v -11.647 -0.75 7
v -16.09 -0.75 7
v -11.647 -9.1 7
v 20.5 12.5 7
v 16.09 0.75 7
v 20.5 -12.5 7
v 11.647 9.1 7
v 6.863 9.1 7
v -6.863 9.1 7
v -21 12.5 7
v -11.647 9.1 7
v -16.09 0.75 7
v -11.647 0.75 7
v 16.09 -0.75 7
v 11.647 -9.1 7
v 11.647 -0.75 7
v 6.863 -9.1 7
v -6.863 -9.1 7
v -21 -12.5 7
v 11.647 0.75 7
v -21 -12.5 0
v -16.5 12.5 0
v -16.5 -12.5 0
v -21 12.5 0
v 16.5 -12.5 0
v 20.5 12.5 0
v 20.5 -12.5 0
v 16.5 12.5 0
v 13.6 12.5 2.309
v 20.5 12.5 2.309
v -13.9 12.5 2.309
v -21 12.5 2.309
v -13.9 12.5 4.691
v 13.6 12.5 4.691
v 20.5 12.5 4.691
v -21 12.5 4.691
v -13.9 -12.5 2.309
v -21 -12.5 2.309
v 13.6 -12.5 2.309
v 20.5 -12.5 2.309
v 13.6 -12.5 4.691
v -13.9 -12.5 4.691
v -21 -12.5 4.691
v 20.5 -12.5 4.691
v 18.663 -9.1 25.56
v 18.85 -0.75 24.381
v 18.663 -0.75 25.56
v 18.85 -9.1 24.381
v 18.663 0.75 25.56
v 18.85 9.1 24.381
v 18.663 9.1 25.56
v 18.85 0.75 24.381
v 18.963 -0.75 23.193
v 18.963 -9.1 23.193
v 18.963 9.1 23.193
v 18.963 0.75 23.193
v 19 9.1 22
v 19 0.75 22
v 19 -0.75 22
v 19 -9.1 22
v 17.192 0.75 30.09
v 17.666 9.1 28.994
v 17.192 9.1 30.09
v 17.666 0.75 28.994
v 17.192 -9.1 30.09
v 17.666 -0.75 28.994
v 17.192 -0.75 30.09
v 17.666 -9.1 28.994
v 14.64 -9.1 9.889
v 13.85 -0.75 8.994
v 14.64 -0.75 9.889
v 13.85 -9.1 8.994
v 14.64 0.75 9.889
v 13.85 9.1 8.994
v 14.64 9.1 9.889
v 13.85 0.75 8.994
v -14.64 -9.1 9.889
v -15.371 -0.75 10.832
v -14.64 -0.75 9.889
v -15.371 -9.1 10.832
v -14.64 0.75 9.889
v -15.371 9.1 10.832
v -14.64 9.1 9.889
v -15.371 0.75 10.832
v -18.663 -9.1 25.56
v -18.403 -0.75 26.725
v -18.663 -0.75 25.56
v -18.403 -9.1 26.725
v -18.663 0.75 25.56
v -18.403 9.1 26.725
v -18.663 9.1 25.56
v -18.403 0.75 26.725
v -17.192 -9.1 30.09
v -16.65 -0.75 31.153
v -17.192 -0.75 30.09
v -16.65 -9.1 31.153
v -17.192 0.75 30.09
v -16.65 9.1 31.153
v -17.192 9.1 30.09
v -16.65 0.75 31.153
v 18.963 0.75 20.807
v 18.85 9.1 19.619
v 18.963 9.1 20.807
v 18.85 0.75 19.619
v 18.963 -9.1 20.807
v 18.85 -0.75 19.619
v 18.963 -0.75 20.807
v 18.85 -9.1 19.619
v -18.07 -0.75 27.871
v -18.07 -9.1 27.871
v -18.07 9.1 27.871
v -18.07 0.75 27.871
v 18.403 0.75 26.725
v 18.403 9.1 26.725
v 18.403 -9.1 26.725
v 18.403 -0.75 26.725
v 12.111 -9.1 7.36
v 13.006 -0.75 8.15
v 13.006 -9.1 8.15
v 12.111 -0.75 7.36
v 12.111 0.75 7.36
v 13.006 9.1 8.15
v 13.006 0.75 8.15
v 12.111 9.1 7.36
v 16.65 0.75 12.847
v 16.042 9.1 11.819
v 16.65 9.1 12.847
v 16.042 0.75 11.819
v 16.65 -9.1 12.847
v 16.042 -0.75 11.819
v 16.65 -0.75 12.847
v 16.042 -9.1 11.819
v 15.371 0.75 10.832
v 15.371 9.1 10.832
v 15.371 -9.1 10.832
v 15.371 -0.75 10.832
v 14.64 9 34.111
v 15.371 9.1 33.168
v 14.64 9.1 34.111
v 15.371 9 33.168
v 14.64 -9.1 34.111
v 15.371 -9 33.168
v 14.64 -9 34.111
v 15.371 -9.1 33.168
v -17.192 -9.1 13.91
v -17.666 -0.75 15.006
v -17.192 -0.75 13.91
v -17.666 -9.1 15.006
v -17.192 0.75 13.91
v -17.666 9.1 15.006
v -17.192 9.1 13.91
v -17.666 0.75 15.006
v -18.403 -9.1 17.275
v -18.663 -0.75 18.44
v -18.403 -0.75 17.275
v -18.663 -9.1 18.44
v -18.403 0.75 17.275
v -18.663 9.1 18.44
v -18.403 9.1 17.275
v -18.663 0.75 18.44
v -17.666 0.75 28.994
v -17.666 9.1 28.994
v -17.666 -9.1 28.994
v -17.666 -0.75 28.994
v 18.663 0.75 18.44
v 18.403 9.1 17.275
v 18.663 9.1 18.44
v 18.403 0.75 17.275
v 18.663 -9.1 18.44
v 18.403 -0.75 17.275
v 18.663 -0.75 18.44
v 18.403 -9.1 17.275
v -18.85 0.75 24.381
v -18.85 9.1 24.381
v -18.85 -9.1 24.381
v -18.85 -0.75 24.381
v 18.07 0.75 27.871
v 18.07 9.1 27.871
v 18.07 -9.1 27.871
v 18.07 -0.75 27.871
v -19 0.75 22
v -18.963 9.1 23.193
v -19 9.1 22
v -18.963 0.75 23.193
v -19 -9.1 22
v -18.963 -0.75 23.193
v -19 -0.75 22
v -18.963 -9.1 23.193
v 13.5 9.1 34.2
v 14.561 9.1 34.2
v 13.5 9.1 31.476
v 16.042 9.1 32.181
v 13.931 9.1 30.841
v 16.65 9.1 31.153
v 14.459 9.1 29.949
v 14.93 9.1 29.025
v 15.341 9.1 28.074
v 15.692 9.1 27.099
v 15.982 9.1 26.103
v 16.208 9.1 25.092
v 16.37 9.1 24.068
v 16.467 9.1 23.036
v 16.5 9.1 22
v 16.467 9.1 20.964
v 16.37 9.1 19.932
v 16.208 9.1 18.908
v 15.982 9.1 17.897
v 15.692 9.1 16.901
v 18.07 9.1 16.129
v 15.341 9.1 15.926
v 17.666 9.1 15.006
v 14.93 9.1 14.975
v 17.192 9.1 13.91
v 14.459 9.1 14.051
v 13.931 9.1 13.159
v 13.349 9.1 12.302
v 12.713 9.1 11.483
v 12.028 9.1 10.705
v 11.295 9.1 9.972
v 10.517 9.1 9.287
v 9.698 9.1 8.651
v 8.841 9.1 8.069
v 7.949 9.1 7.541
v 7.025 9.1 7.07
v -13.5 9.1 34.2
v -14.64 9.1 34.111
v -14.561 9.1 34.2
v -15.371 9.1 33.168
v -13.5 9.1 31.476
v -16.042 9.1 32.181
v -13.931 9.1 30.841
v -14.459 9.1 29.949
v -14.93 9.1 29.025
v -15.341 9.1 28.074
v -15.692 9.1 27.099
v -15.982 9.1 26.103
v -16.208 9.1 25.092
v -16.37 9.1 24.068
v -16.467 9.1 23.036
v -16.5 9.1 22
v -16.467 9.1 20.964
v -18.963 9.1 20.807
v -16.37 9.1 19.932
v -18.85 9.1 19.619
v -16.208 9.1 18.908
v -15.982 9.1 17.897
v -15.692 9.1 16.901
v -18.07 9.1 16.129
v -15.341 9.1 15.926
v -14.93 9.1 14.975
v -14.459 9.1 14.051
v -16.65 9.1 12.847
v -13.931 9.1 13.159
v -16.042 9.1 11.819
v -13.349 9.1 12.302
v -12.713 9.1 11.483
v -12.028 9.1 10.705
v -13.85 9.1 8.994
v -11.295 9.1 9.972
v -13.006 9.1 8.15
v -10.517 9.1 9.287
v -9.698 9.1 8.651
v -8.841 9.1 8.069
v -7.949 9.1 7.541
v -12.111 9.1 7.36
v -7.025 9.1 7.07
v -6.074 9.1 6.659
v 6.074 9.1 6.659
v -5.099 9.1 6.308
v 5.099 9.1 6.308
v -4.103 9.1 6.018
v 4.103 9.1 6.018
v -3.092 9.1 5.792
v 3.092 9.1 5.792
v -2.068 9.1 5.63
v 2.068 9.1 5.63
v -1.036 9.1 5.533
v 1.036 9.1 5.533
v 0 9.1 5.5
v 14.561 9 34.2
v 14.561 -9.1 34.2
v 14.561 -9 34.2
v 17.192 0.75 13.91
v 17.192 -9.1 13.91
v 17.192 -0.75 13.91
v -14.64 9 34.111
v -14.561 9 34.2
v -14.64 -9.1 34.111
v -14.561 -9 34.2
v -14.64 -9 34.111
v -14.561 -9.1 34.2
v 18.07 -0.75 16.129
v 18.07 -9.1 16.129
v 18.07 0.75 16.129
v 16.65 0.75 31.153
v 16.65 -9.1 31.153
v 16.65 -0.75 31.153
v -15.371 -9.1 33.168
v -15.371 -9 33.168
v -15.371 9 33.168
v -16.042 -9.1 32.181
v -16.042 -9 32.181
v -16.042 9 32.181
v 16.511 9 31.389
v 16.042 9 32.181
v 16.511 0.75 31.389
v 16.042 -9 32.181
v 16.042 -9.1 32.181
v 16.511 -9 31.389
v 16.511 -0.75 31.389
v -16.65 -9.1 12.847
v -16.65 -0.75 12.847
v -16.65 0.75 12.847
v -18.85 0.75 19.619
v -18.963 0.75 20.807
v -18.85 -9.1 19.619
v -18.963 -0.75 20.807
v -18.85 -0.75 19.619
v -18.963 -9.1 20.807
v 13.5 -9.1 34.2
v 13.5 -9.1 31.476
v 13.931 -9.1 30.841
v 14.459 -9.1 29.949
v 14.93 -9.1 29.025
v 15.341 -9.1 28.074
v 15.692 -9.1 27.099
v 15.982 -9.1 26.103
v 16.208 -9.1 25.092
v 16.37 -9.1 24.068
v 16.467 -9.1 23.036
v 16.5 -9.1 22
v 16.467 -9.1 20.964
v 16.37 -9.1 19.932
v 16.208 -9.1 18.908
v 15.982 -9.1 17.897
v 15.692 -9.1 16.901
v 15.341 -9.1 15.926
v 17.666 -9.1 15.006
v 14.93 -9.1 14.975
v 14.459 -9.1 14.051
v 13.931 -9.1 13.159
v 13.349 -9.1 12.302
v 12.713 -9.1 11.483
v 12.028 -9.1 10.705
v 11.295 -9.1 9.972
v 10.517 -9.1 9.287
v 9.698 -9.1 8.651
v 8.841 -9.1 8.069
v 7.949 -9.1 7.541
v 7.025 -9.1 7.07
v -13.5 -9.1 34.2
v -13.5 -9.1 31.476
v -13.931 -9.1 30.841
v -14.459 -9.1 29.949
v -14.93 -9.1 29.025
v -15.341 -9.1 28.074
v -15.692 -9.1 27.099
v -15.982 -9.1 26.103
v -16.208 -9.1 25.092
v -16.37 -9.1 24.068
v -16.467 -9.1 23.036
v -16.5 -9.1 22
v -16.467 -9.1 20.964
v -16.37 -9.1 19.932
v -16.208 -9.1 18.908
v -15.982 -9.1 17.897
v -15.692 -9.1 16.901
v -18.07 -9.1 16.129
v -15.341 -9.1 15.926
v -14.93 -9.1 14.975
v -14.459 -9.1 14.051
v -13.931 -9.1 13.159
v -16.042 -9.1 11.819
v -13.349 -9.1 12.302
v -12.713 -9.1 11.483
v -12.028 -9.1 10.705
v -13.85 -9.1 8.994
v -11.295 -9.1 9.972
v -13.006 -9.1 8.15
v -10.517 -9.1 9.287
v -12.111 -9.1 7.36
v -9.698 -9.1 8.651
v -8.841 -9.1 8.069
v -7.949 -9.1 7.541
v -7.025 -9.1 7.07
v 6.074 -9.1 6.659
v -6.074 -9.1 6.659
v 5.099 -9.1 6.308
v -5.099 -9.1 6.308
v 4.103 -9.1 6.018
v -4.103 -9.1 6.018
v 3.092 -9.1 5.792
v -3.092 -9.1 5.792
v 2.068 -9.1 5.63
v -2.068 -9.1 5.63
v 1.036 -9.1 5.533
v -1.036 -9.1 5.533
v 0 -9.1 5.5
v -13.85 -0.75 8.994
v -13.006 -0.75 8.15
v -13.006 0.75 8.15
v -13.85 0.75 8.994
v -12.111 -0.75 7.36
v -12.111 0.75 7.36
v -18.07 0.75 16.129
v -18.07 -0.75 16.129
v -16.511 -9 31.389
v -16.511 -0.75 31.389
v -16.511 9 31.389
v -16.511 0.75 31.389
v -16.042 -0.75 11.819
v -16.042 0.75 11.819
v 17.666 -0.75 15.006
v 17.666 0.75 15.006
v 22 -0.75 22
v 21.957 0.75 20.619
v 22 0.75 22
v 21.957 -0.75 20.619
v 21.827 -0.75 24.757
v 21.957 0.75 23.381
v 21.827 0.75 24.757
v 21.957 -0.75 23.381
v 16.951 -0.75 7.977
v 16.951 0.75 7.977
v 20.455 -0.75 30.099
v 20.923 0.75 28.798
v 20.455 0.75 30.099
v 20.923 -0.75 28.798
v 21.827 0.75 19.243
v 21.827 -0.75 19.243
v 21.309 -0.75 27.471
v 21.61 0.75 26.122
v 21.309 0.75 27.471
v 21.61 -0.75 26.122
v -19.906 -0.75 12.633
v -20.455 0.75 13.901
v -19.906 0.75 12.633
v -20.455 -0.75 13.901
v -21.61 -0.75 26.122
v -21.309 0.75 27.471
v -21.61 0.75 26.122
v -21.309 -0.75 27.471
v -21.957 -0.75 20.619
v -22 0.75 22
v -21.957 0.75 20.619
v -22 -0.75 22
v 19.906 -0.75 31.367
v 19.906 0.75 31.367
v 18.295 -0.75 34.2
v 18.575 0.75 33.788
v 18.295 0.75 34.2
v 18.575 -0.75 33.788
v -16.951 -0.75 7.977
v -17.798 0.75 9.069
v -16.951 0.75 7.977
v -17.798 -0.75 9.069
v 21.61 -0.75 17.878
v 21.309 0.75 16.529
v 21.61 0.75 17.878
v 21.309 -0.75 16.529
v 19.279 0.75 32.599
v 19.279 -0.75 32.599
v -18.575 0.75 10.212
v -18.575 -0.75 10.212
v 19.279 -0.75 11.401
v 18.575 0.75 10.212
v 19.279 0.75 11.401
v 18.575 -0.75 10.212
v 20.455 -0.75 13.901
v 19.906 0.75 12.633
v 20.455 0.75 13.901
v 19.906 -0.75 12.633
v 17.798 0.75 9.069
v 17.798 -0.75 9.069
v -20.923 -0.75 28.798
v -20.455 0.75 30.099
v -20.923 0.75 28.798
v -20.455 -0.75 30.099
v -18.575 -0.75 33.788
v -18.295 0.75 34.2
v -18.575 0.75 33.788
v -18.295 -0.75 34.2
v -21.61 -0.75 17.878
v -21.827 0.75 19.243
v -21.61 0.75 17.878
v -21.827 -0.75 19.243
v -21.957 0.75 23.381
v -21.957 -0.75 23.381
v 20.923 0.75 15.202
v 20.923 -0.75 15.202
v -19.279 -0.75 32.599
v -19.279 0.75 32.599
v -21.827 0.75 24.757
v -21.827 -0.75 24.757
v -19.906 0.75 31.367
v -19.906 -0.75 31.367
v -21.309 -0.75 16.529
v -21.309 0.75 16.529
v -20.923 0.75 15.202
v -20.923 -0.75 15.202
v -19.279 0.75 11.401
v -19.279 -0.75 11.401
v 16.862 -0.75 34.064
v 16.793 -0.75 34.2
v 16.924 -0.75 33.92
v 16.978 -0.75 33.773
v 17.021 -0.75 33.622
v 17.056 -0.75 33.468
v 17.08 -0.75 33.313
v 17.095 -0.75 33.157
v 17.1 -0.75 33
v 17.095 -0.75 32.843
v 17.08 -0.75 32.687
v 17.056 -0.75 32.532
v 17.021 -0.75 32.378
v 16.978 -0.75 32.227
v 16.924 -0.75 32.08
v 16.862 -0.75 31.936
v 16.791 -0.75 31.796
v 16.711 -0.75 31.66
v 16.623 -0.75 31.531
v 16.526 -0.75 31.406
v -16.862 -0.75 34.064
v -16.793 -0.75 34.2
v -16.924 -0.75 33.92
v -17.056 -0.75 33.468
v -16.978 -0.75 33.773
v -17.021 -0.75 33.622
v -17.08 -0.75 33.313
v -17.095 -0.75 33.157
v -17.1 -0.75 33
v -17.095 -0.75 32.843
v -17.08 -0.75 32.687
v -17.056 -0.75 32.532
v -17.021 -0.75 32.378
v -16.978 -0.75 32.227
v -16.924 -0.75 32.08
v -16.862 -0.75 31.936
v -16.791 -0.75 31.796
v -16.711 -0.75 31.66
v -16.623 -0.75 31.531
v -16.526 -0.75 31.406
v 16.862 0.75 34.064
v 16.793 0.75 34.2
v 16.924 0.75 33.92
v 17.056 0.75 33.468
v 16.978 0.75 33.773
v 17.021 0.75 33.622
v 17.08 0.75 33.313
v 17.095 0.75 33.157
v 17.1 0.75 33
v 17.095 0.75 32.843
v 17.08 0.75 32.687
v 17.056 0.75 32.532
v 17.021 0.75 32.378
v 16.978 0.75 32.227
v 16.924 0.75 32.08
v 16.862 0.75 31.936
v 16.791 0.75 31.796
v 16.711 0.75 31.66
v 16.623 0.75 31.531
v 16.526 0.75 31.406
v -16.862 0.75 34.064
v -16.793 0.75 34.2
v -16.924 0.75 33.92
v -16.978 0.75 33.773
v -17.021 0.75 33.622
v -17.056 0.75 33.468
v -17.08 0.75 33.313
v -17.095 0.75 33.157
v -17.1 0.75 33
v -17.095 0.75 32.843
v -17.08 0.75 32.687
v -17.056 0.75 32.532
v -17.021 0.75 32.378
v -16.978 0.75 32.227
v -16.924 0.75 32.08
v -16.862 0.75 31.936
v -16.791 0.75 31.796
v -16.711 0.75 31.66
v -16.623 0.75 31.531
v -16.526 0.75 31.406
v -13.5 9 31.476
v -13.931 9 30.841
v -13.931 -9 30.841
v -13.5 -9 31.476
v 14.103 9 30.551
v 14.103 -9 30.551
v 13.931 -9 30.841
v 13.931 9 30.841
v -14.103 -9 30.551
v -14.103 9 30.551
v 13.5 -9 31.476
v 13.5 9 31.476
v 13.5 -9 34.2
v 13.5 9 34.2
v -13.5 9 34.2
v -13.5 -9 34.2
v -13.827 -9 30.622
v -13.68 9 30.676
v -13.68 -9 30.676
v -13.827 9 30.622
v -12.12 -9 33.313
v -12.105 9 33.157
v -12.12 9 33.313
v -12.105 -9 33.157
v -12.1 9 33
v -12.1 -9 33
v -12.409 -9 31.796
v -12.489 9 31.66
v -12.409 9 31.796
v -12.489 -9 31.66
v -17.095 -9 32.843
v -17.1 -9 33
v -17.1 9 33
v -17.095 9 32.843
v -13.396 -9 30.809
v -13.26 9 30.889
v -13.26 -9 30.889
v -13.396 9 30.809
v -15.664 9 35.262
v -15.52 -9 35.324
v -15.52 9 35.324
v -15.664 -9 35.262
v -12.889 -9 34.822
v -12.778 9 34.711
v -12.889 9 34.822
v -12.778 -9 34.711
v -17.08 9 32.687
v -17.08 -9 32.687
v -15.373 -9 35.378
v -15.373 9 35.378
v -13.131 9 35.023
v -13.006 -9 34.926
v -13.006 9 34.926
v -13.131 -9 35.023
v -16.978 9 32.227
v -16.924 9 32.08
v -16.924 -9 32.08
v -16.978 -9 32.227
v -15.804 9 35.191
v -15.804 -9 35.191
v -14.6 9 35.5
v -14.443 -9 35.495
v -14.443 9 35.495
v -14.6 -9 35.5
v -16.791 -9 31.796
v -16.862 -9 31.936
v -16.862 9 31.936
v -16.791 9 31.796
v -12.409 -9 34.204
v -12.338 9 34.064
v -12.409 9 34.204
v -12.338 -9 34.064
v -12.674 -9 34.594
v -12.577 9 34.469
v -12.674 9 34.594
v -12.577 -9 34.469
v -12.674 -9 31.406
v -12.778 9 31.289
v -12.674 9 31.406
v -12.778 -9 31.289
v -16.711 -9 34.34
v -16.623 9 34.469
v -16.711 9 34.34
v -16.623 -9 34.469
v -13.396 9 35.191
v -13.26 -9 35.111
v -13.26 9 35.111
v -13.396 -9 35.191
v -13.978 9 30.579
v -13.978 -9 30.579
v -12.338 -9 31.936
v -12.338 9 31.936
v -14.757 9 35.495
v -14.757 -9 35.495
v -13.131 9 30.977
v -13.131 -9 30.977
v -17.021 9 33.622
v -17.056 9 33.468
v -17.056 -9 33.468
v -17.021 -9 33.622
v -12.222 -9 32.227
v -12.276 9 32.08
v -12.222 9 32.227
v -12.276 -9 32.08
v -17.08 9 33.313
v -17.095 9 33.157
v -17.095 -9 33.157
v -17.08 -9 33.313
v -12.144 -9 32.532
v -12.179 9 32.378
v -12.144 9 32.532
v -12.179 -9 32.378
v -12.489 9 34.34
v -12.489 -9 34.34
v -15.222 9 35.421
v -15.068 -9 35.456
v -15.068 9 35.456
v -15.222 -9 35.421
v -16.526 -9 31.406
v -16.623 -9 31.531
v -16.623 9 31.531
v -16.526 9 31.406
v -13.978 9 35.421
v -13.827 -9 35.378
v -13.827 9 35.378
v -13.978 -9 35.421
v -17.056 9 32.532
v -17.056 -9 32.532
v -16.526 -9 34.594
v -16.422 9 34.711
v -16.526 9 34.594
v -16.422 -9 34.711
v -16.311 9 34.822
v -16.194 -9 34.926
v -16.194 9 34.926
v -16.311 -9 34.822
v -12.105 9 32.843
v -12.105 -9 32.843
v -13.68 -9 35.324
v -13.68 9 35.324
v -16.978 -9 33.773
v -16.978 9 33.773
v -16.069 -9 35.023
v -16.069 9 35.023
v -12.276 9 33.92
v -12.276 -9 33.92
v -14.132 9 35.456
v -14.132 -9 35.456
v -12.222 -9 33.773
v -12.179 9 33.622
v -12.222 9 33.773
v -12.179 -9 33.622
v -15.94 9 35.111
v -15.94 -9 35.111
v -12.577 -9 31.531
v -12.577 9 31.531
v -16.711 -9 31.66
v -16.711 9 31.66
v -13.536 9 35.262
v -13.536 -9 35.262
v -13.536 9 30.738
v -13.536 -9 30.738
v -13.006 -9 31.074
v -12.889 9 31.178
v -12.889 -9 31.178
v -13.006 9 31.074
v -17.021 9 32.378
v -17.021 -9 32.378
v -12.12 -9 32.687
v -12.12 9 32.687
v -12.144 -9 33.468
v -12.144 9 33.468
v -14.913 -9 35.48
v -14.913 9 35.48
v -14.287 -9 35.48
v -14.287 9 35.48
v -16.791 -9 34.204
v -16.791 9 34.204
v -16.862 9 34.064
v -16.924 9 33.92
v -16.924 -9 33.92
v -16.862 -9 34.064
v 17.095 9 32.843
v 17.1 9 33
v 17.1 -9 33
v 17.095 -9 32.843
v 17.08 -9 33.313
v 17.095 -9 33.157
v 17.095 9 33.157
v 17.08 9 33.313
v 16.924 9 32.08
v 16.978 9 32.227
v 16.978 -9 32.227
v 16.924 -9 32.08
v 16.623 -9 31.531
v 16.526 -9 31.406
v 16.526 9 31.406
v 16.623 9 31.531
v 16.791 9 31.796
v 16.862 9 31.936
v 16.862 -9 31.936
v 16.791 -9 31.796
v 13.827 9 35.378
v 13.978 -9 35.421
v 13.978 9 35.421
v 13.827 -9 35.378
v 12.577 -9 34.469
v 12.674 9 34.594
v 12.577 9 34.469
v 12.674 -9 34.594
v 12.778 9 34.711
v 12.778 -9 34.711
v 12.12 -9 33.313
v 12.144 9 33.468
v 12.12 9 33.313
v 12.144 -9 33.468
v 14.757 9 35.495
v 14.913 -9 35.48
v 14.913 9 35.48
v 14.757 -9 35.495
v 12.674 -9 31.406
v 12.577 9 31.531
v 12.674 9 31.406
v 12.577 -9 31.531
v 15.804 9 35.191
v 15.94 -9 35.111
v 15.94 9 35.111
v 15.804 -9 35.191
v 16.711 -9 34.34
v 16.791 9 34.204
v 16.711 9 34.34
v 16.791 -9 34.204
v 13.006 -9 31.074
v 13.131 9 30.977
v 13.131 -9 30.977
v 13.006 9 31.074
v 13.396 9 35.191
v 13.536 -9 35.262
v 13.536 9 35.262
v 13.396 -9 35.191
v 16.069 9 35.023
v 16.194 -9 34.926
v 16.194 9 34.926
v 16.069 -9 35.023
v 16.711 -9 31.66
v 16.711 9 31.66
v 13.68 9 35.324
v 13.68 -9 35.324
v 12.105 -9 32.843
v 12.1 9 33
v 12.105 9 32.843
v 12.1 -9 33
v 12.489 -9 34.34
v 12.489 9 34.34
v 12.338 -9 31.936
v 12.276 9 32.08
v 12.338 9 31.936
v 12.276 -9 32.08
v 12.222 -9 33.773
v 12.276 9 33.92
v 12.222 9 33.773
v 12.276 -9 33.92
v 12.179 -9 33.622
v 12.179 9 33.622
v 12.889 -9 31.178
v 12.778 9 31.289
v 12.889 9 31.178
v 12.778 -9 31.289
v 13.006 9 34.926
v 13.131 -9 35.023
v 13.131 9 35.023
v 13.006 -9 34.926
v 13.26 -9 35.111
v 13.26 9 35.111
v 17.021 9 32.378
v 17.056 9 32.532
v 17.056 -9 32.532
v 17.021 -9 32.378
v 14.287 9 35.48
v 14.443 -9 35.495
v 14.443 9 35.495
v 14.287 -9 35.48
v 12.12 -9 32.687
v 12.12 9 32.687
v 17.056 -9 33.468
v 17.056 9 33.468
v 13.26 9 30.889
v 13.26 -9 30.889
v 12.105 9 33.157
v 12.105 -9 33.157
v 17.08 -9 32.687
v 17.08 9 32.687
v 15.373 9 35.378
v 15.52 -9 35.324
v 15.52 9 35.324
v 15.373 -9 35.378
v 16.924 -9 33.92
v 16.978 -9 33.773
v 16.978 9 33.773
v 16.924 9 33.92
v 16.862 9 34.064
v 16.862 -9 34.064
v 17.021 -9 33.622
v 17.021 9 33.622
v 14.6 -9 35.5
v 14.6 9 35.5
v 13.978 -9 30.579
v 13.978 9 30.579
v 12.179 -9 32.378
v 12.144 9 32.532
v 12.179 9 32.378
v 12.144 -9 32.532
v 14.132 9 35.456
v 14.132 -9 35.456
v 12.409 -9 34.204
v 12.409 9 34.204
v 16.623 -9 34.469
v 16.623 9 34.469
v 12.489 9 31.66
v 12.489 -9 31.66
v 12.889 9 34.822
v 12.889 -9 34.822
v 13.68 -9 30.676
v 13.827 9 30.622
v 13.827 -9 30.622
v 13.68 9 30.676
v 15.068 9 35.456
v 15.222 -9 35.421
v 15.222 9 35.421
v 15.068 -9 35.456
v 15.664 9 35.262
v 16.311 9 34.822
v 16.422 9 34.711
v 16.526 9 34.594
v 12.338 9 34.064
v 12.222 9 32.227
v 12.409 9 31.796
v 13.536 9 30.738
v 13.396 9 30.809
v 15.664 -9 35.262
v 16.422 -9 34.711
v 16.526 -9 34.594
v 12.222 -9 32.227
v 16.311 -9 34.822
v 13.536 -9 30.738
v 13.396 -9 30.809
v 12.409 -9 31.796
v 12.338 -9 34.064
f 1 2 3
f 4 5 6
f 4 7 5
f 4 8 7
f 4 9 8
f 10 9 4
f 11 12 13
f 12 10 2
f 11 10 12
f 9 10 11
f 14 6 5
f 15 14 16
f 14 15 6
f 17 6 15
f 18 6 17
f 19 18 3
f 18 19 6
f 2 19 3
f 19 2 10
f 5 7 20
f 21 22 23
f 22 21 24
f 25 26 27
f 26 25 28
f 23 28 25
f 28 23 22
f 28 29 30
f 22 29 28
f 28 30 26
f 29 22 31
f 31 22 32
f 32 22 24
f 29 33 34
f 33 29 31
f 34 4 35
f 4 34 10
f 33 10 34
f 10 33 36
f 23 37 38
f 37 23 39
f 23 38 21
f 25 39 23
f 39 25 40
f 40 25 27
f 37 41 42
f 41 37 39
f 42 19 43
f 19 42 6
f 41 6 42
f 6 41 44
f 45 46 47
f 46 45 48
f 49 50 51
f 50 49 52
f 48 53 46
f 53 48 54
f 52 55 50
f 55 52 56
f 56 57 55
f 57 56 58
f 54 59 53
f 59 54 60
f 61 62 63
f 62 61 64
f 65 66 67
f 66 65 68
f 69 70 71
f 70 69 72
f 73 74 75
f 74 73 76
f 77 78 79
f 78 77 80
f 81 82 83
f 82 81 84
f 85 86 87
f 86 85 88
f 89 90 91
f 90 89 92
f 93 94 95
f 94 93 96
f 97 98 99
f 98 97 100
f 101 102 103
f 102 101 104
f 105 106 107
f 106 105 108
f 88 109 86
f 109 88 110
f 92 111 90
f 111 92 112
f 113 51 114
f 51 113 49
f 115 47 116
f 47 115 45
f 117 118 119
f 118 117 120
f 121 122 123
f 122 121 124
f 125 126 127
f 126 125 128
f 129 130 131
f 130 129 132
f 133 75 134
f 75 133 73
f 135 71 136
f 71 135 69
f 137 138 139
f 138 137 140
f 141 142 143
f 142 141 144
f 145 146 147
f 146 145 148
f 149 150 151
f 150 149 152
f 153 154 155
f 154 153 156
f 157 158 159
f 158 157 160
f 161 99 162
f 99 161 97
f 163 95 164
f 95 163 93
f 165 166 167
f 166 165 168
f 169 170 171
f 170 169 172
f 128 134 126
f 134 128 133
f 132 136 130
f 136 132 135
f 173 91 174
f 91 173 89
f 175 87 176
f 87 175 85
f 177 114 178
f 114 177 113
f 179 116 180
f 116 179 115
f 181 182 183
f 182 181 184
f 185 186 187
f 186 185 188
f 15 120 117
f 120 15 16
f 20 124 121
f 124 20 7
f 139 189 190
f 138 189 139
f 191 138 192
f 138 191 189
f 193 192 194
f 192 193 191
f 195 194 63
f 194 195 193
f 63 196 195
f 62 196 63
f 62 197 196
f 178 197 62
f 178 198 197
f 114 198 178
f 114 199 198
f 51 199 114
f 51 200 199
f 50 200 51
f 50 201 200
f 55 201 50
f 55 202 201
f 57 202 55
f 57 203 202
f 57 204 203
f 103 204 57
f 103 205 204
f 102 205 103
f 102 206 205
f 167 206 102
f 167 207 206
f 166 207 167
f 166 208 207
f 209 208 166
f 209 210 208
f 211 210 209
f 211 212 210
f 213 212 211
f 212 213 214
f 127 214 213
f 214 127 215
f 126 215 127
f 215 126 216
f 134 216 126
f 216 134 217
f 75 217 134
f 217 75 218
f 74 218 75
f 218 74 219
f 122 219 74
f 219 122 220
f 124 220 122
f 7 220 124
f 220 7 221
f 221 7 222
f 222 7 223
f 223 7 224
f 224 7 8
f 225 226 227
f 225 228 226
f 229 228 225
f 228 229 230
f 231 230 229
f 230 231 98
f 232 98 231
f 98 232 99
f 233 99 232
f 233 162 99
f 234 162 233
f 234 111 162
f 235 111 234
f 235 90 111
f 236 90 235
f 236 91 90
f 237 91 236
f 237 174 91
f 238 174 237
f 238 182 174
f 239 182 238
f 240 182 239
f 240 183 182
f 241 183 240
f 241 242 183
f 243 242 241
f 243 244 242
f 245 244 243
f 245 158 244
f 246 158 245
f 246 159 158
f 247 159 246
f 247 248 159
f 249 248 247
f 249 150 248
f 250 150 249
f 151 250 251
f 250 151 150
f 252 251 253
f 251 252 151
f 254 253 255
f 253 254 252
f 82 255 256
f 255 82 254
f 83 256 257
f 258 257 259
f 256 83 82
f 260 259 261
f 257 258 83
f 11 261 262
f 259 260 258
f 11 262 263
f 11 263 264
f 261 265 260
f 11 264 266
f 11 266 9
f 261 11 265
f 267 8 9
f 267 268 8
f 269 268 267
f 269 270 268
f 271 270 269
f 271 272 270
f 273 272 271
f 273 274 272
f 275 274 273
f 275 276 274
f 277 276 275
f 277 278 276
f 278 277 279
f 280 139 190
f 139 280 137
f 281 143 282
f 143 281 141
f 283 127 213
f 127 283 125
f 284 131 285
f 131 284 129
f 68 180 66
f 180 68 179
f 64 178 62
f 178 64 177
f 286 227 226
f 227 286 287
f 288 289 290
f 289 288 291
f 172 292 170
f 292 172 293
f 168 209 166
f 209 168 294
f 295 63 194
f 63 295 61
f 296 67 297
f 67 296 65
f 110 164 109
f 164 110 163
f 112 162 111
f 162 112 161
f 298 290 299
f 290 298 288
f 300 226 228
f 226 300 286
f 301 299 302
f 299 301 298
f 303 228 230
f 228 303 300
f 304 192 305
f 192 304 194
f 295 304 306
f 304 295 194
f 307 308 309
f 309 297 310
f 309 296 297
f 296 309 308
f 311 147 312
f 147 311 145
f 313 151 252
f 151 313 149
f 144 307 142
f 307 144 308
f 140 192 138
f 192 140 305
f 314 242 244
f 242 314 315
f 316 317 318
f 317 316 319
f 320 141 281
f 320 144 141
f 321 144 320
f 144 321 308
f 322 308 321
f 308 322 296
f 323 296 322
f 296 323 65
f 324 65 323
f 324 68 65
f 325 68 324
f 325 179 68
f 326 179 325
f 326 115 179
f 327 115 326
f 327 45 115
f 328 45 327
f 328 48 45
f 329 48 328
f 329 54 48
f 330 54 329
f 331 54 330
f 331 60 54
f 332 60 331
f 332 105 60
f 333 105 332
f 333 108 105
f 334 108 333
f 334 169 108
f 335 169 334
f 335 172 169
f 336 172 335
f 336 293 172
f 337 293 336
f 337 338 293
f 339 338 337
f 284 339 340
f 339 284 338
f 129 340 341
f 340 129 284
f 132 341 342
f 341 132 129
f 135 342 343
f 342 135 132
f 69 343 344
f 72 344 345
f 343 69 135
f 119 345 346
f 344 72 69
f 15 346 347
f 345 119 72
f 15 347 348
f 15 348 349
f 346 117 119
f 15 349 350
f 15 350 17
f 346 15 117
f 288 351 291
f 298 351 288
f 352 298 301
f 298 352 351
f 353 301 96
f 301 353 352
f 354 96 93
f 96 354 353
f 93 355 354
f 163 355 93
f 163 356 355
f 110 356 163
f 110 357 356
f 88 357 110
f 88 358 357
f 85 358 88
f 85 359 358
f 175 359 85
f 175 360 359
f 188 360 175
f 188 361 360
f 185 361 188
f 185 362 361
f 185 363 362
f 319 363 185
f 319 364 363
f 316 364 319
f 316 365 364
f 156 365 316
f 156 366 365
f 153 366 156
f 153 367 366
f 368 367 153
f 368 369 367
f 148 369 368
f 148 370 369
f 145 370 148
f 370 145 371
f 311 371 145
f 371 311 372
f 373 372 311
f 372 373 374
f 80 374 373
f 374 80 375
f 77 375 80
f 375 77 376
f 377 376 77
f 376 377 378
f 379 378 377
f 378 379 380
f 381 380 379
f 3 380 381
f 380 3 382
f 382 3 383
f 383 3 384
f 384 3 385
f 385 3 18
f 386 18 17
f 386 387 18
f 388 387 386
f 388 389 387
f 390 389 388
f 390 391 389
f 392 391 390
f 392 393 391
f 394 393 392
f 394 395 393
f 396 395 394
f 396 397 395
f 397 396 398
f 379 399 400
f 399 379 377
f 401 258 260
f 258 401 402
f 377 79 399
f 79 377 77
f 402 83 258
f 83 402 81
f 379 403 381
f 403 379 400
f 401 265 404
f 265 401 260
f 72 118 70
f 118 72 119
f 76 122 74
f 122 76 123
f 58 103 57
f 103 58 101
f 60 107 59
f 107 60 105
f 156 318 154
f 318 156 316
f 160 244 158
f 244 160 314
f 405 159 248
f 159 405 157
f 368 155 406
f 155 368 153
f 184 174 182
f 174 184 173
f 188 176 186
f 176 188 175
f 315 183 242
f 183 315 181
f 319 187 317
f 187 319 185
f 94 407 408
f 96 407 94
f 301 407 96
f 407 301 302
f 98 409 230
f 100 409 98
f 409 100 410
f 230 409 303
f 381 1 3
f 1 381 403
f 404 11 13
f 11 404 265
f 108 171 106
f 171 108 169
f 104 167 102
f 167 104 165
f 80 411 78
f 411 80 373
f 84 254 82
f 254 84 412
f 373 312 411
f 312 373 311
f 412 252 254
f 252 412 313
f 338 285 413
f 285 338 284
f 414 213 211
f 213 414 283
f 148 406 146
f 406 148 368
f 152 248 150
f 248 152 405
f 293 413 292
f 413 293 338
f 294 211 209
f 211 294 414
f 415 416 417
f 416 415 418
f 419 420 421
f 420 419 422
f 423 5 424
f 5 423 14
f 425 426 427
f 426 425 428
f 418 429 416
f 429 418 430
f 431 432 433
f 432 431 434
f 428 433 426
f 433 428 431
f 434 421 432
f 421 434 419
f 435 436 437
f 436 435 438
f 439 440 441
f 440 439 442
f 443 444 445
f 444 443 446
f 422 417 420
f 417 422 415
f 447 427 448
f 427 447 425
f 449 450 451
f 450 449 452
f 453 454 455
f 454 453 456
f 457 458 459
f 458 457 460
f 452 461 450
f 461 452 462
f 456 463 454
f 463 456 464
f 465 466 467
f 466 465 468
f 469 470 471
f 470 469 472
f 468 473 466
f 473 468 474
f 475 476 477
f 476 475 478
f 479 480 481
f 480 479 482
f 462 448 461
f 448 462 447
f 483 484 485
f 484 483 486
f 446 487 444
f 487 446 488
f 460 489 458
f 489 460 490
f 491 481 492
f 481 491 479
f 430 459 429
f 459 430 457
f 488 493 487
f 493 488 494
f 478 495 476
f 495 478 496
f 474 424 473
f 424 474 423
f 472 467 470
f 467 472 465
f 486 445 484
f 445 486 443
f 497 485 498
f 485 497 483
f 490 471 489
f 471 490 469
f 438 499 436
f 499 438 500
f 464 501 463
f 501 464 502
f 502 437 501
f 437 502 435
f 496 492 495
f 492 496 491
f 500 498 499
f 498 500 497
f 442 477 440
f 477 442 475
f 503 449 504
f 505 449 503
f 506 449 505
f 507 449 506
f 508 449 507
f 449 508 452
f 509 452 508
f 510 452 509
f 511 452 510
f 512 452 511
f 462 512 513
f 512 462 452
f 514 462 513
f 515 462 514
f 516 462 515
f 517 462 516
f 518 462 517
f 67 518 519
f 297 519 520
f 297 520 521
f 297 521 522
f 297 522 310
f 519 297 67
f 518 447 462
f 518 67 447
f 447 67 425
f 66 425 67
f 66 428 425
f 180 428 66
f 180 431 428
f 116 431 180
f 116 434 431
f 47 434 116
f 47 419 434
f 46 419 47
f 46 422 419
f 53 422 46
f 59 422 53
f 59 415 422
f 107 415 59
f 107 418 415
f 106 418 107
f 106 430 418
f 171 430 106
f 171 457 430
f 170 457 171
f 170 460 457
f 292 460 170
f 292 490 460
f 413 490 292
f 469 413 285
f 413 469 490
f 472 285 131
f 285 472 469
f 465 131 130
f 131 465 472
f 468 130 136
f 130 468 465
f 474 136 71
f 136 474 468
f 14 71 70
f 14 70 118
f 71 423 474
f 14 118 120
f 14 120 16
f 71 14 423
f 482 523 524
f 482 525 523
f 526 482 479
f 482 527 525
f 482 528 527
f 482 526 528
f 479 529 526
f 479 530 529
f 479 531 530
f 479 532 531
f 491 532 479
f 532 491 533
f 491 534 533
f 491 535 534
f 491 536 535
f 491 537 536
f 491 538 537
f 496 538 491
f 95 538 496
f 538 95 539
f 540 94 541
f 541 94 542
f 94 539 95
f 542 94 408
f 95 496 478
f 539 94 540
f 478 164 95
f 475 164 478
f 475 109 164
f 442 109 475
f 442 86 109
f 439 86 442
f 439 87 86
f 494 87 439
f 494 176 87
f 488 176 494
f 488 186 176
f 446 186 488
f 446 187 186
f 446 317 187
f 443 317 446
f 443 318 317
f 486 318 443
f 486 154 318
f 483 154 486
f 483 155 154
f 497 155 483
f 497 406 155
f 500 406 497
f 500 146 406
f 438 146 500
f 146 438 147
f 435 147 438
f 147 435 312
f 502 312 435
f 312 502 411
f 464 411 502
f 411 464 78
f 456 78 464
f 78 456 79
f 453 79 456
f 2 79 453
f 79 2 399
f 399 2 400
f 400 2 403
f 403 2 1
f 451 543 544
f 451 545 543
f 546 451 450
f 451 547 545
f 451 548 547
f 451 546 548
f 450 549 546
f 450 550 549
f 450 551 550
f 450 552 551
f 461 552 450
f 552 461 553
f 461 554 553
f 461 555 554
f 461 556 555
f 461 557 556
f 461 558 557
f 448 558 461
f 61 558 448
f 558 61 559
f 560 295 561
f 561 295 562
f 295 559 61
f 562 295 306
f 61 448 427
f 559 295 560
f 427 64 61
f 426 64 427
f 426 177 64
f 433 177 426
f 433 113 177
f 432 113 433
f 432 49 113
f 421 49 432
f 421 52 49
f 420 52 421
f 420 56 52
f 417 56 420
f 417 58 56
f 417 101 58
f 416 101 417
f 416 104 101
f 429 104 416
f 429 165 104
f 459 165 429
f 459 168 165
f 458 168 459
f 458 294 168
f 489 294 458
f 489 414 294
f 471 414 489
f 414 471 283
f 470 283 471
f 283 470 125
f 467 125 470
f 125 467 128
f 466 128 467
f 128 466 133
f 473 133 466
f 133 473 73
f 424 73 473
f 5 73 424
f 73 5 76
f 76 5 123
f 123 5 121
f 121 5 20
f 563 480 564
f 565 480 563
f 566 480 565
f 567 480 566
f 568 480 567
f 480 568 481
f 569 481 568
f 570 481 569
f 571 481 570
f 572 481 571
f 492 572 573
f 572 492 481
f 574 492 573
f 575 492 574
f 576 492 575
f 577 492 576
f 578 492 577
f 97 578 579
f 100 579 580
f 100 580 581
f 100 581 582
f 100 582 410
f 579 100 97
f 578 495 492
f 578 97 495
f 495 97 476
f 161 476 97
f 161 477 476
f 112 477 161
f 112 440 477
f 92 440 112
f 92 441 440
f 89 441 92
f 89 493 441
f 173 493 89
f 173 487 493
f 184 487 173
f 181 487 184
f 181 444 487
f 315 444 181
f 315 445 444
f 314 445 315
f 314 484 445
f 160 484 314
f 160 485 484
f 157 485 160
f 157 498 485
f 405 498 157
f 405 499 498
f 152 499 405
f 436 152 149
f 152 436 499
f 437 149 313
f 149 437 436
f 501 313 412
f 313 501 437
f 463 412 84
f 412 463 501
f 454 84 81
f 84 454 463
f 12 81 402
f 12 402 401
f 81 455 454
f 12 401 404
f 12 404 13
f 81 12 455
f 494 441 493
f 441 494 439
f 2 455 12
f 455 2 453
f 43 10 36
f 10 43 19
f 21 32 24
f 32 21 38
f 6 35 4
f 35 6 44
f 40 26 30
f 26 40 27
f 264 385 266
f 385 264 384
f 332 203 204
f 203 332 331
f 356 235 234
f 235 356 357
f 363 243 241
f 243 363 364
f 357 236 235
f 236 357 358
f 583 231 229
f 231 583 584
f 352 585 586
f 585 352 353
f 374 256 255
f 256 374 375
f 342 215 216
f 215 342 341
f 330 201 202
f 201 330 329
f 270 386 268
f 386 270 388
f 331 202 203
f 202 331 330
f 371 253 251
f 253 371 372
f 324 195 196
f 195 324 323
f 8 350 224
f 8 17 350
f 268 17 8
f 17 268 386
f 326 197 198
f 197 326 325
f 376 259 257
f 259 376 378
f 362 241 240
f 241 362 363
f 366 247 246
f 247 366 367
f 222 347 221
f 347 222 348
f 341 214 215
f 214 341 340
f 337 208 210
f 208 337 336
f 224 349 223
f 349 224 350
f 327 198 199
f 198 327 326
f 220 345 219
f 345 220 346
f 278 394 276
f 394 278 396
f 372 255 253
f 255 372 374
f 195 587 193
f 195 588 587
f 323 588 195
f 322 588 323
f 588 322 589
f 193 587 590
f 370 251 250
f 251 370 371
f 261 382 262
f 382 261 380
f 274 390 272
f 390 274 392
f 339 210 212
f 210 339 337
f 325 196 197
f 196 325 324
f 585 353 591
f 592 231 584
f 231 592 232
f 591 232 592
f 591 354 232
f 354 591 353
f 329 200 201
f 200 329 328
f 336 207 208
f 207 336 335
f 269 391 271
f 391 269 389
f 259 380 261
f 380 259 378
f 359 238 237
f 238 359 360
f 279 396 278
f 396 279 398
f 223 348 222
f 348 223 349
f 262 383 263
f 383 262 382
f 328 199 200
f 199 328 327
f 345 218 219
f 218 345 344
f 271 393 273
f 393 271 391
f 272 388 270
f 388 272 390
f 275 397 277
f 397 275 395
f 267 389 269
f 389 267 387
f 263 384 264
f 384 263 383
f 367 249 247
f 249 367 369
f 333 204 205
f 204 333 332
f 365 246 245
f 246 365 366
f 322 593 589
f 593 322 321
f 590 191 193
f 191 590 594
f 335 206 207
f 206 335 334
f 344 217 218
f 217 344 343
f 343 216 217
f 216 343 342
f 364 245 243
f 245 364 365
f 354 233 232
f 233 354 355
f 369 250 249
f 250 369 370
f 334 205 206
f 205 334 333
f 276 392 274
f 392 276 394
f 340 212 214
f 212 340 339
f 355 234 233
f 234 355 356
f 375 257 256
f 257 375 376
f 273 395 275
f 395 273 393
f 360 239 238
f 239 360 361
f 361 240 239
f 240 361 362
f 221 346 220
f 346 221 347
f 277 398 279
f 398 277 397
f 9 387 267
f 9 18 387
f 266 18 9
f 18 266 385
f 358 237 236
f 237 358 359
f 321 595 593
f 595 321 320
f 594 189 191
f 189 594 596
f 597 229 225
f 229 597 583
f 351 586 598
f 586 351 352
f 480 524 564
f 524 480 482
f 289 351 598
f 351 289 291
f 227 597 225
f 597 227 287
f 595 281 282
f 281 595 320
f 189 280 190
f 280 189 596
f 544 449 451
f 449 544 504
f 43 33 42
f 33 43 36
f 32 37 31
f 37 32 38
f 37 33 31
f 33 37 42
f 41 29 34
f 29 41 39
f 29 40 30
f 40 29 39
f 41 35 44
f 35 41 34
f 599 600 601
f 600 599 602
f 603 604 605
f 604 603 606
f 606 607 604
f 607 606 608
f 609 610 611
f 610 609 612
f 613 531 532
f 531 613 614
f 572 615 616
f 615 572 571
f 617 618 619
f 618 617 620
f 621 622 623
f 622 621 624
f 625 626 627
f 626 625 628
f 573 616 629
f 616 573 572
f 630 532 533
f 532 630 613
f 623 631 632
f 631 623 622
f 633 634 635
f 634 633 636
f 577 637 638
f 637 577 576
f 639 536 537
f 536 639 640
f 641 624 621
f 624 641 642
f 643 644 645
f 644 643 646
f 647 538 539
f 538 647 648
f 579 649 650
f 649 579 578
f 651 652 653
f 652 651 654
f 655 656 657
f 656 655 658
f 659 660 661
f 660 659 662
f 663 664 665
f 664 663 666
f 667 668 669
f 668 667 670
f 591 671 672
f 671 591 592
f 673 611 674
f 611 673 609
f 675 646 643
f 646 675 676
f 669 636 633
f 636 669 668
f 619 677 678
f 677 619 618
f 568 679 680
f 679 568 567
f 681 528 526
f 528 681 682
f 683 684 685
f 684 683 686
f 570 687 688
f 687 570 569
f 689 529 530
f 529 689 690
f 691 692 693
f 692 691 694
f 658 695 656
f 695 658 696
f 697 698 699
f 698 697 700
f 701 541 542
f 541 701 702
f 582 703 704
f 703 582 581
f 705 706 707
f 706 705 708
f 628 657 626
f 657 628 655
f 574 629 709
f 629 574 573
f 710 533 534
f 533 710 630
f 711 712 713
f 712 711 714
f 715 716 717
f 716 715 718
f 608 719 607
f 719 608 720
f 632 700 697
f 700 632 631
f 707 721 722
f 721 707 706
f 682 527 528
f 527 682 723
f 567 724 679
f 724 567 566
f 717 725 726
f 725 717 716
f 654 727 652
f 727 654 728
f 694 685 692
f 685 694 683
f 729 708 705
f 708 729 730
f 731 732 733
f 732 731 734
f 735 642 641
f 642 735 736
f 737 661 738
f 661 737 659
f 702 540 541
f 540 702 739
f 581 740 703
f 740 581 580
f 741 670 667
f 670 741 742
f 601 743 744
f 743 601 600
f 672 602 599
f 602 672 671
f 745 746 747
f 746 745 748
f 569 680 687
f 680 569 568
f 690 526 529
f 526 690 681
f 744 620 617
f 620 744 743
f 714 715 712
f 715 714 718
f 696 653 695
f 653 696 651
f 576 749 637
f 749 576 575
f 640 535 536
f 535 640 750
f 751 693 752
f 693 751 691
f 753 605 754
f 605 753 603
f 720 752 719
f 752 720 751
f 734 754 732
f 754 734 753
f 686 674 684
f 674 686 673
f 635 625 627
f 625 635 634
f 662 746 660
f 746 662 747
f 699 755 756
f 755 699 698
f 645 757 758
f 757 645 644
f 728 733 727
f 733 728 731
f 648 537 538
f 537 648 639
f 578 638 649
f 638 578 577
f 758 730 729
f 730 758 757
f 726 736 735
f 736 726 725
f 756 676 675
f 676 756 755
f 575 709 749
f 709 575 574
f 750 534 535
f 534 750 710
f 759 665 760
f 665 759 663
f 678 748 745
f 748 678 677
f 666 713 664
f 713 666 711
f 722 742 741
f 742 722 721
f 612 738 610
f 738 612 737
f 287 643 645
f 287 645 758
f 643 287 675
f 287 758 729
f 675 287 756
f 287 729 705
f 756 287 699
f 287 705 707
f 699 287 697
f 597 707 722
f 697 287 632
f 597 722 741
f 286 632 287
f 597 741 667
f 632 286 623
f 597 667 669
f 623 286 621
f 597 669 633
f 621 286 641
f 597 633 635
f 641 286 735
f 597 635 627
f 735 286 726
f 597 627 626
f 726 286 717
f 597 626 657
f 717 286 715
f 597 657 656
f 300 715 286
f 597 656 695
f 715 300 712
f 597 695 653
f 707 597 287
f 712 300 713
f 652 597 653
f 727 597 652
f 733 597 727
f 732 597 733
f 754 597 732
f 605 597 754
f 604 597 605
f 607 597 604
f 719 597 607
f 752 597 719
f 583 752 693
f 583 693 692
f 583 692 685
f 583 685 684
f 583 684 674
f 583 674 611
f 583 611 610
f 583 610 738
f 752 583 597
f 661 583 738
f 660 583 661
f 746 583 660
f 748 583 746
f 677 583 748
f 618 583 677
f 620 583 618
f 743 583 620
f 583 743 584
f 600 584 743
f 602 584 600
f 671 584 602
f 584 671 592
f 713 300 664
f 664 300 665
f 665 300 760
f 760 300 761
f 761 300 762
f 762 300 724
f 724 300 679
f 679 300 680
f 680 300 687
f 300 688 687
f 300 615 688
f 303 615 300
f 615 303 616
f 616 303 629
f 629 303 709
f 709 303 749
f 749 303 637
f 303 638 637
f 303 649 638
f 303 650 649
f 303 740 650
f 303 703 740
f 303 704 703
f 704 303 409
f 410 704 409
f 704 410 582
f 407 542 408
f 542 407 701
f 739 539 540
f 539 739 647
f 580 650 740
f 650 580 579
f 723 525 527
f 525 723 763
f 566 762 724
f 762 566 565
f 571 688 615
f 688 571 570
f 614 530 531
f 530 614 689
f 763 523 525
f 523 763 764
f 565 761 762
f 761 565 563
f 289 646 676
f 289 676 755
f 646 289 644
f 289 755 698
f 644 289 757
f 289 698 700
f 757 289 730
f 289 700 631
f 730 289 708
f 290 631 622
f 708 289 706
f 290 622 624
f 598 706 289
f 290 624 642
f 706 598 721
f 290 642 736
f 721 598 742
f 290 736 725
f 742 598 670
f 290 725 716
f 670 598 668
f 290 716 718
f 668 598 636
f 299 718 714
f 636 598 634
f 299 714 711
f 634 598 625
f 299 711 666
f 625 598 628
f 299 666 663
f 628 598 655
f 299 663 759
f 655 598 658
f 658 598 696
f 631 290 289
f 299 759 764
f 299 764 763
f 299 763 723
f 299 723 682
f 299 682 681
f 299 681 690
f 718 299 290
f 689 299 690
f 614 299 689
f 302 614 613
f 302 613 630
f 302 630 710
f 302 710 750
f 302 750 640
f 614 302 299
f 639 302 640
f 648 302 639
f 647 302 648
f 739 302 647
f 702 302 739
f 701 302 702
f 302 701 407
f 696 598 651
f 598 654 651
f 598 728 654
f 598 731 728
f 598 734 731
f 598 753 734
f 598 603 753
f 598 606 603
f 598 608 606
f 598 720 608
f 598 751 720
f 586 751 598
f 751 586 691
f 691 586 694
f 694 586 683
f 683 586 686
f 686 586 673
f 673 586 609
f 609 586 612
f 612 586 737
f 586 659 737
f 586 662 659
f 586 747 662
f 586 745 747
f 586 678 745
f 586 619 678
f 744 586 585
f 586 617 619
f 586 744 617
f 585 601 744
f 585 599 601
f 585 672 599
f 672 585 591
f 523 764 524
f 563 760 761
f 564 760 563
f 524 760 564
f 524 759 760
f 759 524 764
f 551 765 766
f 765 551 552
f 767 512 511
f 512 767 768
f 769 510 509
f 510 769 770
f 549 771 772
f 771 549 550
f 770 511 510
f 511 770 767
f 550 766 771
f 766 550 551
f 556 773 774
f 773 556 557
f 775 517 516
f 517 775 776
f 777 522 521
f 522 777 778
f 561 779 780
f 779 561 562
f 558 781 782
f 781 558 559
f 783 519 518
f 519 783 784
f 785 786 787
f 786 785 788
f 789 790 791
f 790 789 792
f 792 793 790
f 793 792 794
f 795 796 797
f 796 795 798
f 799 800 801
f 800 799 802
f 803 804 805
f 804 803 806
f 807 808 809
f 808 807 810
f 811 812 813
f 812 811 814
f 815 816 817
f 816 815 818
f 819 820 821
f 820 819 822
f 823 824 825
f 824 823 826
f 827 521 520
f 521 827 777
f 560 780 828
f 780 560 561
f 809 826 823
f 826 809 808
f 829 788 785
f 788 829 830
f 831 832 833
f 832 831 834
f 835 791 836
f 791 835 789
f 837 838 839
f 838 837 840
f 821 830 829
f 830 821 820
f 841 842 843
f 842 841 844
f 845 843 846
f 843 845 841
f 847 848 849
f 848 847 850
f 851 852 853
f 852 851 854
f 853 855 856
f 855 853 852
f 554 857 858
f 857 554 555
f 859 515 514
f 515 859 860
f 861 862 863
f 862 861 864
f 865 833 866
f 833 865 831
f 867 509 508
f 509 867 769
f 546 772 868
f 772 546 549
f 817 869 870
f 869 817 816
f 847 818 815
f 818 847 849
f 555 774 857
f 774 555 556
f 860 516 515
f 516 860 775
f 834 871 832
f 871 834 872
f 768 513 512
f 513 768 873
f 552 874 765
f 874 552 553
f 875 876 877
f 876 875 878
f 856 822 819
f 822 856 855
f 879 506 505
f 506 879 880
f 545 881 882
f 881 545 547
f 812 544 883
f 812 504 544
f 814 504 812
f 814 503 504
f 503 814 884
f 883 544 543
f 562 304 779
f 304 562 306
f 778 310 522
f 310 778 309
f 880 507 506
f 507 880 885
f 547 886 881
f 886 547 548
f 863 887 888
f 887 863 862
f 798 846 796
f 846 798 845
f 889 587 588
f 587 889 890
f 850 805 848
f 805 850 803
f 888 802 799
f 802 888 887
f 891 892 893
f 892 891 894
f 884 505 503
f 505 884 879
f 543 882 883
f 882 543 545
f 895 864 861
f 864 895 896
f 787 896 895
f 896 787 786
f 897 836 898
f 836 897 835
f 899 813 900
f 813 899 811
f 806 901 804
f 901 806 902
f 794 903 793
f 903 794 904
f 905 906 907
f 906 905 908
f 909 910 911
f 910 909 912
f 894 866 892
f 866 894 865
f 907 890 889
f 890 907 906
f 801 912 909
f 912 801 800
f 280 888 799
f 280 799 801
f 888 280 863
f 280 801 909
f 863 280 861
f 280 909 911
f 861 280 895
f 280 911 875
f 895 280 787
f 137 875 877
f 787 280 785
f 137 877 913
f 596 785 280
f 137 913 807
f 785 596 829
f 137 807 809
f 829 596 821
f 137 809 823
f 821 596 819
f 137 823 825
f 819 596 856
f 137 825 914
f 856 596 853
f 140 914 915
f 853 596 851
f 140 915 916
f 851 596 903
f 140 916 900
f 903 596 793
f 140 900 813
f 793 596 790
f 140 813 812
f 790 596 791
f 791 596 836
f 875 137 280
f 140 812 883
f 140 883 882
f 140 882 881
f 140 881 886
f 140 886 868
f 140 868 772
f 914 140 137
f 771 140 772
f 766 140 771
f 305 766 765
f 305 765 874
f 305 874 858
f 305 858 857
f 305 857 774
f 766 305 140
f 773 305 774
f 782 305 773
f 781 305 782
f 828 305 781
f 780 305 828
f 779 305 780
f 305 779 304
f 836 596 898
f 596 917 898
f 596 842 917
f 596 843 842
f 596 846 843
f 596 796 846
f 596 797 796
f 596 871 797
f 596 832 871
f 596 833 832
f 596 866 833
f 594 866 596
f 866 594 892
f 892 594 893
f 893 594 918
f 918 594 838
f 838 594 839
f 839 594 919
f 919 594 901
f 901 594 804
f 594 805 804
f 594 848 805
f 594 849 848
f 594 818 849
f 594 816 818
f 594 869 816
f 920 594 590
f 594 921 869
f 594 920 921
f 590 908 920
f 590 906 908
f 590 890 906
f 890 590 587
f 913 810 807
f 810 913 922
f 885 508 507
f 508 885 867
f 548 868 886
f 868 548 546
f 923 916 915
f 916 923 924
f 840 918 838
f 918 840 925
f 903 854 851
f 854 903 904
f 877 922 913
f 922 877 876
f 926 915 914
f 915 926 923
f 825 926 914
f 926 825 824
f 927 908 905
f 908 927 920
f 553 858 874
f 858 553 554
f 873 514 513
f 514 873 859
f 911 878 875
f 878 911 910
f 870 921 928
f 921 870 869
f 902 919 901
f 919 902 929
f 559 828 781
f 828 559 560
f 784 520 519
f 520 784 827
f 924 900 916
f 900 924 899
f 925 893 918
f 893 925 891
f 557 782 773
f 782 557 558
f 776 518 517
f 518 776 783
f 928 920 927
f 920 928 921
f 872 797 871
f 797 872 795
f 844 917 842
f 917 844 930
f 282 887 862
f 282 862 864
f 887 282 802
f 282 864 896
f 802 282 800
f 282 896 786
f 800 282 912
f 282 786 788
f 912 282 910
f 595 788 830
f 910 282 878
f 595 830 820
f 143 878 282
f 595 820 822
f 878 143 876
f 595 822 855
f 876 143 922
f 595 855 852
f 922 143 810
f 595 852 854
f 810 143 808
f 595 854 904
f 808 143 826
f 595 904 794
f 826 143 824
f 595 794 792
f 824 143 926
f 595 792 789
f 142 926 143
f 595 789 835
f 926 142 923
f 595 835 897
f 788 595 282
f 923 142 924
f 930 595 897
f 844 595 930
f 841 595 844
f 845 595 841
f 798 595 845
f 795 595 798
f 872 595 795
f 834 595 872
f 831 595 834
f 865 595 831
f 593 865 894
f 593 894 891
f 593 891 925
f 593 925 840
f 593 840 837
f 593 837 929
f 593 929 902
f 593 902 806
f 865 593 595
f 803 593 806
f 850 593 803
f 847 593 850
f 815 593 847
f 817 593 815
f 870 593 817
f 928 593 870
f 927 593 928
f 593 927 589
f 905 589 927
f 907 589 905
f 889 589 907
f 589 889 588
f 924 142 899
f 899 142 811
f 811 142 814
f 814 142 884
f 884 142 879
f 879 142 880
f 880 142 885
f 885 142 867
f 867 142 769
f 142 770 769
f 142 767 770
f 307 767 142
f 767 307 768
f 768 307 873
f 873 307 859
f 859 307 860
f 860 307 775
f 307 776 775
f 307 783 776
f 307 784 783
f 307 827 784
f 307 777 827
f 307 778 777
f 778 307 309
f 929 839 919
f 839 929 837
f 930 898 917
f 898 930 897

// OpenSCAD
$fn=100;
rot_front = [90,0,0];
base_w = 26;
base_depth = 25;
base_ht = 7;
base_ball_dia = 6.5;
pipe_dia = 33;
pipe_len = 18.2;
pipe_th = 5;
collar_dia = 6;
collar_th = 1.5;
gap_width = 18;
top_ball_dia = 5;
cut_dia = 13;
glass_th = 3/32*25.4;
pipe_lift = 3;

difference() {
    union() {
        //rotate(rot_front) translate([-base_w/2,base_ball_dia/2,-base_depth/2]) cylinder(base_depth,d=base_ball_dia);
        //rotate(rot_front) translate([base_w/2,base_ball_dia/2,-base_depth/2]) cylinder(base_depth,d=base_ball_dia);
        translate([0,0,base_ht/2]) cube([base_w,base_depth,base_ht],true);
        rotate(rot_front) translate([0,(pipe_dia+pipe_th)/2+pipe_lift,-pipe_len/2]) cylinder(pipe_len,d=pipe_dia+pipe_th);
        rotate(rot_front) translate([0,(pipe_dia+pipe_th)/2+pipe_lift,-collar_th/2]) cylinder(collar_th,d=pipe_dia+pipe_th+collar_dia);
        rotate(rot_front) translate([-base_w+5,0,-base_depth/2]) cube([8,base_ht,base_depth]);
        rotate(rot_front) translate([base_w-13.5,0,-base_depth/2]) cube([8,base_ht,base_depth]);
    }
    //rotate(rot_front) translate([-base_w/2,base_ball_dia/2,-base_depth/2]) cylinder(base_depth,d=base_ball_dia/2);
    //rotate(rot_front) translate([base_w/2,base_ball_dia/2,-base_depth/2]) cylinder(base_depth,d=base_ball_dia/2);
    rotate(rot_front) translate([0,(pipe_dia+pipe_th)/2+pipe_lift,-pipe_len/2]) cylinder(pipe_len,d=pipe_dia);
    translate([0,0,base_w]) cube([gap_width+pipe_th+4,pipe_len*1.01,base_w-4],true); //gap cutout
    mirror([0,0,1]) translate ([-pipe_dia/2,-pipe_dia/2,0]) cube([pipe_dia,pipe_dia,pipe_dia]);
    translate([-pipe_dia,-pipe_dia,pipe_dia+1.2]) cube([pipe_dia*2,pipe_dia*2,pipe_dia*2]); //clear above top of top balls
    rotate(rot_front) translate([-base_w+2.6,(base_ht-glass_th)/2,-base_depth/2]) cube([base_ball_dia+3,glass_th,base_depth]);
    rotate(rot_front) translate([base_w-12.4,(base_ht-glass_th)/2,-base_depth/2]) cube([base_ball_dia+3,glass_th,base_depth]);    
}
rotate(rot_front) translate([-base_w/2-1.6,pipe_dia,-gap_width/2]) cylinder(gap_width,d=top_ball_dia);
rotate(rot_front) translate([base_w/2+1.6,pipe_dia,-gap_width/2]) cylinder(gap_width,d=top_ball_dia);
